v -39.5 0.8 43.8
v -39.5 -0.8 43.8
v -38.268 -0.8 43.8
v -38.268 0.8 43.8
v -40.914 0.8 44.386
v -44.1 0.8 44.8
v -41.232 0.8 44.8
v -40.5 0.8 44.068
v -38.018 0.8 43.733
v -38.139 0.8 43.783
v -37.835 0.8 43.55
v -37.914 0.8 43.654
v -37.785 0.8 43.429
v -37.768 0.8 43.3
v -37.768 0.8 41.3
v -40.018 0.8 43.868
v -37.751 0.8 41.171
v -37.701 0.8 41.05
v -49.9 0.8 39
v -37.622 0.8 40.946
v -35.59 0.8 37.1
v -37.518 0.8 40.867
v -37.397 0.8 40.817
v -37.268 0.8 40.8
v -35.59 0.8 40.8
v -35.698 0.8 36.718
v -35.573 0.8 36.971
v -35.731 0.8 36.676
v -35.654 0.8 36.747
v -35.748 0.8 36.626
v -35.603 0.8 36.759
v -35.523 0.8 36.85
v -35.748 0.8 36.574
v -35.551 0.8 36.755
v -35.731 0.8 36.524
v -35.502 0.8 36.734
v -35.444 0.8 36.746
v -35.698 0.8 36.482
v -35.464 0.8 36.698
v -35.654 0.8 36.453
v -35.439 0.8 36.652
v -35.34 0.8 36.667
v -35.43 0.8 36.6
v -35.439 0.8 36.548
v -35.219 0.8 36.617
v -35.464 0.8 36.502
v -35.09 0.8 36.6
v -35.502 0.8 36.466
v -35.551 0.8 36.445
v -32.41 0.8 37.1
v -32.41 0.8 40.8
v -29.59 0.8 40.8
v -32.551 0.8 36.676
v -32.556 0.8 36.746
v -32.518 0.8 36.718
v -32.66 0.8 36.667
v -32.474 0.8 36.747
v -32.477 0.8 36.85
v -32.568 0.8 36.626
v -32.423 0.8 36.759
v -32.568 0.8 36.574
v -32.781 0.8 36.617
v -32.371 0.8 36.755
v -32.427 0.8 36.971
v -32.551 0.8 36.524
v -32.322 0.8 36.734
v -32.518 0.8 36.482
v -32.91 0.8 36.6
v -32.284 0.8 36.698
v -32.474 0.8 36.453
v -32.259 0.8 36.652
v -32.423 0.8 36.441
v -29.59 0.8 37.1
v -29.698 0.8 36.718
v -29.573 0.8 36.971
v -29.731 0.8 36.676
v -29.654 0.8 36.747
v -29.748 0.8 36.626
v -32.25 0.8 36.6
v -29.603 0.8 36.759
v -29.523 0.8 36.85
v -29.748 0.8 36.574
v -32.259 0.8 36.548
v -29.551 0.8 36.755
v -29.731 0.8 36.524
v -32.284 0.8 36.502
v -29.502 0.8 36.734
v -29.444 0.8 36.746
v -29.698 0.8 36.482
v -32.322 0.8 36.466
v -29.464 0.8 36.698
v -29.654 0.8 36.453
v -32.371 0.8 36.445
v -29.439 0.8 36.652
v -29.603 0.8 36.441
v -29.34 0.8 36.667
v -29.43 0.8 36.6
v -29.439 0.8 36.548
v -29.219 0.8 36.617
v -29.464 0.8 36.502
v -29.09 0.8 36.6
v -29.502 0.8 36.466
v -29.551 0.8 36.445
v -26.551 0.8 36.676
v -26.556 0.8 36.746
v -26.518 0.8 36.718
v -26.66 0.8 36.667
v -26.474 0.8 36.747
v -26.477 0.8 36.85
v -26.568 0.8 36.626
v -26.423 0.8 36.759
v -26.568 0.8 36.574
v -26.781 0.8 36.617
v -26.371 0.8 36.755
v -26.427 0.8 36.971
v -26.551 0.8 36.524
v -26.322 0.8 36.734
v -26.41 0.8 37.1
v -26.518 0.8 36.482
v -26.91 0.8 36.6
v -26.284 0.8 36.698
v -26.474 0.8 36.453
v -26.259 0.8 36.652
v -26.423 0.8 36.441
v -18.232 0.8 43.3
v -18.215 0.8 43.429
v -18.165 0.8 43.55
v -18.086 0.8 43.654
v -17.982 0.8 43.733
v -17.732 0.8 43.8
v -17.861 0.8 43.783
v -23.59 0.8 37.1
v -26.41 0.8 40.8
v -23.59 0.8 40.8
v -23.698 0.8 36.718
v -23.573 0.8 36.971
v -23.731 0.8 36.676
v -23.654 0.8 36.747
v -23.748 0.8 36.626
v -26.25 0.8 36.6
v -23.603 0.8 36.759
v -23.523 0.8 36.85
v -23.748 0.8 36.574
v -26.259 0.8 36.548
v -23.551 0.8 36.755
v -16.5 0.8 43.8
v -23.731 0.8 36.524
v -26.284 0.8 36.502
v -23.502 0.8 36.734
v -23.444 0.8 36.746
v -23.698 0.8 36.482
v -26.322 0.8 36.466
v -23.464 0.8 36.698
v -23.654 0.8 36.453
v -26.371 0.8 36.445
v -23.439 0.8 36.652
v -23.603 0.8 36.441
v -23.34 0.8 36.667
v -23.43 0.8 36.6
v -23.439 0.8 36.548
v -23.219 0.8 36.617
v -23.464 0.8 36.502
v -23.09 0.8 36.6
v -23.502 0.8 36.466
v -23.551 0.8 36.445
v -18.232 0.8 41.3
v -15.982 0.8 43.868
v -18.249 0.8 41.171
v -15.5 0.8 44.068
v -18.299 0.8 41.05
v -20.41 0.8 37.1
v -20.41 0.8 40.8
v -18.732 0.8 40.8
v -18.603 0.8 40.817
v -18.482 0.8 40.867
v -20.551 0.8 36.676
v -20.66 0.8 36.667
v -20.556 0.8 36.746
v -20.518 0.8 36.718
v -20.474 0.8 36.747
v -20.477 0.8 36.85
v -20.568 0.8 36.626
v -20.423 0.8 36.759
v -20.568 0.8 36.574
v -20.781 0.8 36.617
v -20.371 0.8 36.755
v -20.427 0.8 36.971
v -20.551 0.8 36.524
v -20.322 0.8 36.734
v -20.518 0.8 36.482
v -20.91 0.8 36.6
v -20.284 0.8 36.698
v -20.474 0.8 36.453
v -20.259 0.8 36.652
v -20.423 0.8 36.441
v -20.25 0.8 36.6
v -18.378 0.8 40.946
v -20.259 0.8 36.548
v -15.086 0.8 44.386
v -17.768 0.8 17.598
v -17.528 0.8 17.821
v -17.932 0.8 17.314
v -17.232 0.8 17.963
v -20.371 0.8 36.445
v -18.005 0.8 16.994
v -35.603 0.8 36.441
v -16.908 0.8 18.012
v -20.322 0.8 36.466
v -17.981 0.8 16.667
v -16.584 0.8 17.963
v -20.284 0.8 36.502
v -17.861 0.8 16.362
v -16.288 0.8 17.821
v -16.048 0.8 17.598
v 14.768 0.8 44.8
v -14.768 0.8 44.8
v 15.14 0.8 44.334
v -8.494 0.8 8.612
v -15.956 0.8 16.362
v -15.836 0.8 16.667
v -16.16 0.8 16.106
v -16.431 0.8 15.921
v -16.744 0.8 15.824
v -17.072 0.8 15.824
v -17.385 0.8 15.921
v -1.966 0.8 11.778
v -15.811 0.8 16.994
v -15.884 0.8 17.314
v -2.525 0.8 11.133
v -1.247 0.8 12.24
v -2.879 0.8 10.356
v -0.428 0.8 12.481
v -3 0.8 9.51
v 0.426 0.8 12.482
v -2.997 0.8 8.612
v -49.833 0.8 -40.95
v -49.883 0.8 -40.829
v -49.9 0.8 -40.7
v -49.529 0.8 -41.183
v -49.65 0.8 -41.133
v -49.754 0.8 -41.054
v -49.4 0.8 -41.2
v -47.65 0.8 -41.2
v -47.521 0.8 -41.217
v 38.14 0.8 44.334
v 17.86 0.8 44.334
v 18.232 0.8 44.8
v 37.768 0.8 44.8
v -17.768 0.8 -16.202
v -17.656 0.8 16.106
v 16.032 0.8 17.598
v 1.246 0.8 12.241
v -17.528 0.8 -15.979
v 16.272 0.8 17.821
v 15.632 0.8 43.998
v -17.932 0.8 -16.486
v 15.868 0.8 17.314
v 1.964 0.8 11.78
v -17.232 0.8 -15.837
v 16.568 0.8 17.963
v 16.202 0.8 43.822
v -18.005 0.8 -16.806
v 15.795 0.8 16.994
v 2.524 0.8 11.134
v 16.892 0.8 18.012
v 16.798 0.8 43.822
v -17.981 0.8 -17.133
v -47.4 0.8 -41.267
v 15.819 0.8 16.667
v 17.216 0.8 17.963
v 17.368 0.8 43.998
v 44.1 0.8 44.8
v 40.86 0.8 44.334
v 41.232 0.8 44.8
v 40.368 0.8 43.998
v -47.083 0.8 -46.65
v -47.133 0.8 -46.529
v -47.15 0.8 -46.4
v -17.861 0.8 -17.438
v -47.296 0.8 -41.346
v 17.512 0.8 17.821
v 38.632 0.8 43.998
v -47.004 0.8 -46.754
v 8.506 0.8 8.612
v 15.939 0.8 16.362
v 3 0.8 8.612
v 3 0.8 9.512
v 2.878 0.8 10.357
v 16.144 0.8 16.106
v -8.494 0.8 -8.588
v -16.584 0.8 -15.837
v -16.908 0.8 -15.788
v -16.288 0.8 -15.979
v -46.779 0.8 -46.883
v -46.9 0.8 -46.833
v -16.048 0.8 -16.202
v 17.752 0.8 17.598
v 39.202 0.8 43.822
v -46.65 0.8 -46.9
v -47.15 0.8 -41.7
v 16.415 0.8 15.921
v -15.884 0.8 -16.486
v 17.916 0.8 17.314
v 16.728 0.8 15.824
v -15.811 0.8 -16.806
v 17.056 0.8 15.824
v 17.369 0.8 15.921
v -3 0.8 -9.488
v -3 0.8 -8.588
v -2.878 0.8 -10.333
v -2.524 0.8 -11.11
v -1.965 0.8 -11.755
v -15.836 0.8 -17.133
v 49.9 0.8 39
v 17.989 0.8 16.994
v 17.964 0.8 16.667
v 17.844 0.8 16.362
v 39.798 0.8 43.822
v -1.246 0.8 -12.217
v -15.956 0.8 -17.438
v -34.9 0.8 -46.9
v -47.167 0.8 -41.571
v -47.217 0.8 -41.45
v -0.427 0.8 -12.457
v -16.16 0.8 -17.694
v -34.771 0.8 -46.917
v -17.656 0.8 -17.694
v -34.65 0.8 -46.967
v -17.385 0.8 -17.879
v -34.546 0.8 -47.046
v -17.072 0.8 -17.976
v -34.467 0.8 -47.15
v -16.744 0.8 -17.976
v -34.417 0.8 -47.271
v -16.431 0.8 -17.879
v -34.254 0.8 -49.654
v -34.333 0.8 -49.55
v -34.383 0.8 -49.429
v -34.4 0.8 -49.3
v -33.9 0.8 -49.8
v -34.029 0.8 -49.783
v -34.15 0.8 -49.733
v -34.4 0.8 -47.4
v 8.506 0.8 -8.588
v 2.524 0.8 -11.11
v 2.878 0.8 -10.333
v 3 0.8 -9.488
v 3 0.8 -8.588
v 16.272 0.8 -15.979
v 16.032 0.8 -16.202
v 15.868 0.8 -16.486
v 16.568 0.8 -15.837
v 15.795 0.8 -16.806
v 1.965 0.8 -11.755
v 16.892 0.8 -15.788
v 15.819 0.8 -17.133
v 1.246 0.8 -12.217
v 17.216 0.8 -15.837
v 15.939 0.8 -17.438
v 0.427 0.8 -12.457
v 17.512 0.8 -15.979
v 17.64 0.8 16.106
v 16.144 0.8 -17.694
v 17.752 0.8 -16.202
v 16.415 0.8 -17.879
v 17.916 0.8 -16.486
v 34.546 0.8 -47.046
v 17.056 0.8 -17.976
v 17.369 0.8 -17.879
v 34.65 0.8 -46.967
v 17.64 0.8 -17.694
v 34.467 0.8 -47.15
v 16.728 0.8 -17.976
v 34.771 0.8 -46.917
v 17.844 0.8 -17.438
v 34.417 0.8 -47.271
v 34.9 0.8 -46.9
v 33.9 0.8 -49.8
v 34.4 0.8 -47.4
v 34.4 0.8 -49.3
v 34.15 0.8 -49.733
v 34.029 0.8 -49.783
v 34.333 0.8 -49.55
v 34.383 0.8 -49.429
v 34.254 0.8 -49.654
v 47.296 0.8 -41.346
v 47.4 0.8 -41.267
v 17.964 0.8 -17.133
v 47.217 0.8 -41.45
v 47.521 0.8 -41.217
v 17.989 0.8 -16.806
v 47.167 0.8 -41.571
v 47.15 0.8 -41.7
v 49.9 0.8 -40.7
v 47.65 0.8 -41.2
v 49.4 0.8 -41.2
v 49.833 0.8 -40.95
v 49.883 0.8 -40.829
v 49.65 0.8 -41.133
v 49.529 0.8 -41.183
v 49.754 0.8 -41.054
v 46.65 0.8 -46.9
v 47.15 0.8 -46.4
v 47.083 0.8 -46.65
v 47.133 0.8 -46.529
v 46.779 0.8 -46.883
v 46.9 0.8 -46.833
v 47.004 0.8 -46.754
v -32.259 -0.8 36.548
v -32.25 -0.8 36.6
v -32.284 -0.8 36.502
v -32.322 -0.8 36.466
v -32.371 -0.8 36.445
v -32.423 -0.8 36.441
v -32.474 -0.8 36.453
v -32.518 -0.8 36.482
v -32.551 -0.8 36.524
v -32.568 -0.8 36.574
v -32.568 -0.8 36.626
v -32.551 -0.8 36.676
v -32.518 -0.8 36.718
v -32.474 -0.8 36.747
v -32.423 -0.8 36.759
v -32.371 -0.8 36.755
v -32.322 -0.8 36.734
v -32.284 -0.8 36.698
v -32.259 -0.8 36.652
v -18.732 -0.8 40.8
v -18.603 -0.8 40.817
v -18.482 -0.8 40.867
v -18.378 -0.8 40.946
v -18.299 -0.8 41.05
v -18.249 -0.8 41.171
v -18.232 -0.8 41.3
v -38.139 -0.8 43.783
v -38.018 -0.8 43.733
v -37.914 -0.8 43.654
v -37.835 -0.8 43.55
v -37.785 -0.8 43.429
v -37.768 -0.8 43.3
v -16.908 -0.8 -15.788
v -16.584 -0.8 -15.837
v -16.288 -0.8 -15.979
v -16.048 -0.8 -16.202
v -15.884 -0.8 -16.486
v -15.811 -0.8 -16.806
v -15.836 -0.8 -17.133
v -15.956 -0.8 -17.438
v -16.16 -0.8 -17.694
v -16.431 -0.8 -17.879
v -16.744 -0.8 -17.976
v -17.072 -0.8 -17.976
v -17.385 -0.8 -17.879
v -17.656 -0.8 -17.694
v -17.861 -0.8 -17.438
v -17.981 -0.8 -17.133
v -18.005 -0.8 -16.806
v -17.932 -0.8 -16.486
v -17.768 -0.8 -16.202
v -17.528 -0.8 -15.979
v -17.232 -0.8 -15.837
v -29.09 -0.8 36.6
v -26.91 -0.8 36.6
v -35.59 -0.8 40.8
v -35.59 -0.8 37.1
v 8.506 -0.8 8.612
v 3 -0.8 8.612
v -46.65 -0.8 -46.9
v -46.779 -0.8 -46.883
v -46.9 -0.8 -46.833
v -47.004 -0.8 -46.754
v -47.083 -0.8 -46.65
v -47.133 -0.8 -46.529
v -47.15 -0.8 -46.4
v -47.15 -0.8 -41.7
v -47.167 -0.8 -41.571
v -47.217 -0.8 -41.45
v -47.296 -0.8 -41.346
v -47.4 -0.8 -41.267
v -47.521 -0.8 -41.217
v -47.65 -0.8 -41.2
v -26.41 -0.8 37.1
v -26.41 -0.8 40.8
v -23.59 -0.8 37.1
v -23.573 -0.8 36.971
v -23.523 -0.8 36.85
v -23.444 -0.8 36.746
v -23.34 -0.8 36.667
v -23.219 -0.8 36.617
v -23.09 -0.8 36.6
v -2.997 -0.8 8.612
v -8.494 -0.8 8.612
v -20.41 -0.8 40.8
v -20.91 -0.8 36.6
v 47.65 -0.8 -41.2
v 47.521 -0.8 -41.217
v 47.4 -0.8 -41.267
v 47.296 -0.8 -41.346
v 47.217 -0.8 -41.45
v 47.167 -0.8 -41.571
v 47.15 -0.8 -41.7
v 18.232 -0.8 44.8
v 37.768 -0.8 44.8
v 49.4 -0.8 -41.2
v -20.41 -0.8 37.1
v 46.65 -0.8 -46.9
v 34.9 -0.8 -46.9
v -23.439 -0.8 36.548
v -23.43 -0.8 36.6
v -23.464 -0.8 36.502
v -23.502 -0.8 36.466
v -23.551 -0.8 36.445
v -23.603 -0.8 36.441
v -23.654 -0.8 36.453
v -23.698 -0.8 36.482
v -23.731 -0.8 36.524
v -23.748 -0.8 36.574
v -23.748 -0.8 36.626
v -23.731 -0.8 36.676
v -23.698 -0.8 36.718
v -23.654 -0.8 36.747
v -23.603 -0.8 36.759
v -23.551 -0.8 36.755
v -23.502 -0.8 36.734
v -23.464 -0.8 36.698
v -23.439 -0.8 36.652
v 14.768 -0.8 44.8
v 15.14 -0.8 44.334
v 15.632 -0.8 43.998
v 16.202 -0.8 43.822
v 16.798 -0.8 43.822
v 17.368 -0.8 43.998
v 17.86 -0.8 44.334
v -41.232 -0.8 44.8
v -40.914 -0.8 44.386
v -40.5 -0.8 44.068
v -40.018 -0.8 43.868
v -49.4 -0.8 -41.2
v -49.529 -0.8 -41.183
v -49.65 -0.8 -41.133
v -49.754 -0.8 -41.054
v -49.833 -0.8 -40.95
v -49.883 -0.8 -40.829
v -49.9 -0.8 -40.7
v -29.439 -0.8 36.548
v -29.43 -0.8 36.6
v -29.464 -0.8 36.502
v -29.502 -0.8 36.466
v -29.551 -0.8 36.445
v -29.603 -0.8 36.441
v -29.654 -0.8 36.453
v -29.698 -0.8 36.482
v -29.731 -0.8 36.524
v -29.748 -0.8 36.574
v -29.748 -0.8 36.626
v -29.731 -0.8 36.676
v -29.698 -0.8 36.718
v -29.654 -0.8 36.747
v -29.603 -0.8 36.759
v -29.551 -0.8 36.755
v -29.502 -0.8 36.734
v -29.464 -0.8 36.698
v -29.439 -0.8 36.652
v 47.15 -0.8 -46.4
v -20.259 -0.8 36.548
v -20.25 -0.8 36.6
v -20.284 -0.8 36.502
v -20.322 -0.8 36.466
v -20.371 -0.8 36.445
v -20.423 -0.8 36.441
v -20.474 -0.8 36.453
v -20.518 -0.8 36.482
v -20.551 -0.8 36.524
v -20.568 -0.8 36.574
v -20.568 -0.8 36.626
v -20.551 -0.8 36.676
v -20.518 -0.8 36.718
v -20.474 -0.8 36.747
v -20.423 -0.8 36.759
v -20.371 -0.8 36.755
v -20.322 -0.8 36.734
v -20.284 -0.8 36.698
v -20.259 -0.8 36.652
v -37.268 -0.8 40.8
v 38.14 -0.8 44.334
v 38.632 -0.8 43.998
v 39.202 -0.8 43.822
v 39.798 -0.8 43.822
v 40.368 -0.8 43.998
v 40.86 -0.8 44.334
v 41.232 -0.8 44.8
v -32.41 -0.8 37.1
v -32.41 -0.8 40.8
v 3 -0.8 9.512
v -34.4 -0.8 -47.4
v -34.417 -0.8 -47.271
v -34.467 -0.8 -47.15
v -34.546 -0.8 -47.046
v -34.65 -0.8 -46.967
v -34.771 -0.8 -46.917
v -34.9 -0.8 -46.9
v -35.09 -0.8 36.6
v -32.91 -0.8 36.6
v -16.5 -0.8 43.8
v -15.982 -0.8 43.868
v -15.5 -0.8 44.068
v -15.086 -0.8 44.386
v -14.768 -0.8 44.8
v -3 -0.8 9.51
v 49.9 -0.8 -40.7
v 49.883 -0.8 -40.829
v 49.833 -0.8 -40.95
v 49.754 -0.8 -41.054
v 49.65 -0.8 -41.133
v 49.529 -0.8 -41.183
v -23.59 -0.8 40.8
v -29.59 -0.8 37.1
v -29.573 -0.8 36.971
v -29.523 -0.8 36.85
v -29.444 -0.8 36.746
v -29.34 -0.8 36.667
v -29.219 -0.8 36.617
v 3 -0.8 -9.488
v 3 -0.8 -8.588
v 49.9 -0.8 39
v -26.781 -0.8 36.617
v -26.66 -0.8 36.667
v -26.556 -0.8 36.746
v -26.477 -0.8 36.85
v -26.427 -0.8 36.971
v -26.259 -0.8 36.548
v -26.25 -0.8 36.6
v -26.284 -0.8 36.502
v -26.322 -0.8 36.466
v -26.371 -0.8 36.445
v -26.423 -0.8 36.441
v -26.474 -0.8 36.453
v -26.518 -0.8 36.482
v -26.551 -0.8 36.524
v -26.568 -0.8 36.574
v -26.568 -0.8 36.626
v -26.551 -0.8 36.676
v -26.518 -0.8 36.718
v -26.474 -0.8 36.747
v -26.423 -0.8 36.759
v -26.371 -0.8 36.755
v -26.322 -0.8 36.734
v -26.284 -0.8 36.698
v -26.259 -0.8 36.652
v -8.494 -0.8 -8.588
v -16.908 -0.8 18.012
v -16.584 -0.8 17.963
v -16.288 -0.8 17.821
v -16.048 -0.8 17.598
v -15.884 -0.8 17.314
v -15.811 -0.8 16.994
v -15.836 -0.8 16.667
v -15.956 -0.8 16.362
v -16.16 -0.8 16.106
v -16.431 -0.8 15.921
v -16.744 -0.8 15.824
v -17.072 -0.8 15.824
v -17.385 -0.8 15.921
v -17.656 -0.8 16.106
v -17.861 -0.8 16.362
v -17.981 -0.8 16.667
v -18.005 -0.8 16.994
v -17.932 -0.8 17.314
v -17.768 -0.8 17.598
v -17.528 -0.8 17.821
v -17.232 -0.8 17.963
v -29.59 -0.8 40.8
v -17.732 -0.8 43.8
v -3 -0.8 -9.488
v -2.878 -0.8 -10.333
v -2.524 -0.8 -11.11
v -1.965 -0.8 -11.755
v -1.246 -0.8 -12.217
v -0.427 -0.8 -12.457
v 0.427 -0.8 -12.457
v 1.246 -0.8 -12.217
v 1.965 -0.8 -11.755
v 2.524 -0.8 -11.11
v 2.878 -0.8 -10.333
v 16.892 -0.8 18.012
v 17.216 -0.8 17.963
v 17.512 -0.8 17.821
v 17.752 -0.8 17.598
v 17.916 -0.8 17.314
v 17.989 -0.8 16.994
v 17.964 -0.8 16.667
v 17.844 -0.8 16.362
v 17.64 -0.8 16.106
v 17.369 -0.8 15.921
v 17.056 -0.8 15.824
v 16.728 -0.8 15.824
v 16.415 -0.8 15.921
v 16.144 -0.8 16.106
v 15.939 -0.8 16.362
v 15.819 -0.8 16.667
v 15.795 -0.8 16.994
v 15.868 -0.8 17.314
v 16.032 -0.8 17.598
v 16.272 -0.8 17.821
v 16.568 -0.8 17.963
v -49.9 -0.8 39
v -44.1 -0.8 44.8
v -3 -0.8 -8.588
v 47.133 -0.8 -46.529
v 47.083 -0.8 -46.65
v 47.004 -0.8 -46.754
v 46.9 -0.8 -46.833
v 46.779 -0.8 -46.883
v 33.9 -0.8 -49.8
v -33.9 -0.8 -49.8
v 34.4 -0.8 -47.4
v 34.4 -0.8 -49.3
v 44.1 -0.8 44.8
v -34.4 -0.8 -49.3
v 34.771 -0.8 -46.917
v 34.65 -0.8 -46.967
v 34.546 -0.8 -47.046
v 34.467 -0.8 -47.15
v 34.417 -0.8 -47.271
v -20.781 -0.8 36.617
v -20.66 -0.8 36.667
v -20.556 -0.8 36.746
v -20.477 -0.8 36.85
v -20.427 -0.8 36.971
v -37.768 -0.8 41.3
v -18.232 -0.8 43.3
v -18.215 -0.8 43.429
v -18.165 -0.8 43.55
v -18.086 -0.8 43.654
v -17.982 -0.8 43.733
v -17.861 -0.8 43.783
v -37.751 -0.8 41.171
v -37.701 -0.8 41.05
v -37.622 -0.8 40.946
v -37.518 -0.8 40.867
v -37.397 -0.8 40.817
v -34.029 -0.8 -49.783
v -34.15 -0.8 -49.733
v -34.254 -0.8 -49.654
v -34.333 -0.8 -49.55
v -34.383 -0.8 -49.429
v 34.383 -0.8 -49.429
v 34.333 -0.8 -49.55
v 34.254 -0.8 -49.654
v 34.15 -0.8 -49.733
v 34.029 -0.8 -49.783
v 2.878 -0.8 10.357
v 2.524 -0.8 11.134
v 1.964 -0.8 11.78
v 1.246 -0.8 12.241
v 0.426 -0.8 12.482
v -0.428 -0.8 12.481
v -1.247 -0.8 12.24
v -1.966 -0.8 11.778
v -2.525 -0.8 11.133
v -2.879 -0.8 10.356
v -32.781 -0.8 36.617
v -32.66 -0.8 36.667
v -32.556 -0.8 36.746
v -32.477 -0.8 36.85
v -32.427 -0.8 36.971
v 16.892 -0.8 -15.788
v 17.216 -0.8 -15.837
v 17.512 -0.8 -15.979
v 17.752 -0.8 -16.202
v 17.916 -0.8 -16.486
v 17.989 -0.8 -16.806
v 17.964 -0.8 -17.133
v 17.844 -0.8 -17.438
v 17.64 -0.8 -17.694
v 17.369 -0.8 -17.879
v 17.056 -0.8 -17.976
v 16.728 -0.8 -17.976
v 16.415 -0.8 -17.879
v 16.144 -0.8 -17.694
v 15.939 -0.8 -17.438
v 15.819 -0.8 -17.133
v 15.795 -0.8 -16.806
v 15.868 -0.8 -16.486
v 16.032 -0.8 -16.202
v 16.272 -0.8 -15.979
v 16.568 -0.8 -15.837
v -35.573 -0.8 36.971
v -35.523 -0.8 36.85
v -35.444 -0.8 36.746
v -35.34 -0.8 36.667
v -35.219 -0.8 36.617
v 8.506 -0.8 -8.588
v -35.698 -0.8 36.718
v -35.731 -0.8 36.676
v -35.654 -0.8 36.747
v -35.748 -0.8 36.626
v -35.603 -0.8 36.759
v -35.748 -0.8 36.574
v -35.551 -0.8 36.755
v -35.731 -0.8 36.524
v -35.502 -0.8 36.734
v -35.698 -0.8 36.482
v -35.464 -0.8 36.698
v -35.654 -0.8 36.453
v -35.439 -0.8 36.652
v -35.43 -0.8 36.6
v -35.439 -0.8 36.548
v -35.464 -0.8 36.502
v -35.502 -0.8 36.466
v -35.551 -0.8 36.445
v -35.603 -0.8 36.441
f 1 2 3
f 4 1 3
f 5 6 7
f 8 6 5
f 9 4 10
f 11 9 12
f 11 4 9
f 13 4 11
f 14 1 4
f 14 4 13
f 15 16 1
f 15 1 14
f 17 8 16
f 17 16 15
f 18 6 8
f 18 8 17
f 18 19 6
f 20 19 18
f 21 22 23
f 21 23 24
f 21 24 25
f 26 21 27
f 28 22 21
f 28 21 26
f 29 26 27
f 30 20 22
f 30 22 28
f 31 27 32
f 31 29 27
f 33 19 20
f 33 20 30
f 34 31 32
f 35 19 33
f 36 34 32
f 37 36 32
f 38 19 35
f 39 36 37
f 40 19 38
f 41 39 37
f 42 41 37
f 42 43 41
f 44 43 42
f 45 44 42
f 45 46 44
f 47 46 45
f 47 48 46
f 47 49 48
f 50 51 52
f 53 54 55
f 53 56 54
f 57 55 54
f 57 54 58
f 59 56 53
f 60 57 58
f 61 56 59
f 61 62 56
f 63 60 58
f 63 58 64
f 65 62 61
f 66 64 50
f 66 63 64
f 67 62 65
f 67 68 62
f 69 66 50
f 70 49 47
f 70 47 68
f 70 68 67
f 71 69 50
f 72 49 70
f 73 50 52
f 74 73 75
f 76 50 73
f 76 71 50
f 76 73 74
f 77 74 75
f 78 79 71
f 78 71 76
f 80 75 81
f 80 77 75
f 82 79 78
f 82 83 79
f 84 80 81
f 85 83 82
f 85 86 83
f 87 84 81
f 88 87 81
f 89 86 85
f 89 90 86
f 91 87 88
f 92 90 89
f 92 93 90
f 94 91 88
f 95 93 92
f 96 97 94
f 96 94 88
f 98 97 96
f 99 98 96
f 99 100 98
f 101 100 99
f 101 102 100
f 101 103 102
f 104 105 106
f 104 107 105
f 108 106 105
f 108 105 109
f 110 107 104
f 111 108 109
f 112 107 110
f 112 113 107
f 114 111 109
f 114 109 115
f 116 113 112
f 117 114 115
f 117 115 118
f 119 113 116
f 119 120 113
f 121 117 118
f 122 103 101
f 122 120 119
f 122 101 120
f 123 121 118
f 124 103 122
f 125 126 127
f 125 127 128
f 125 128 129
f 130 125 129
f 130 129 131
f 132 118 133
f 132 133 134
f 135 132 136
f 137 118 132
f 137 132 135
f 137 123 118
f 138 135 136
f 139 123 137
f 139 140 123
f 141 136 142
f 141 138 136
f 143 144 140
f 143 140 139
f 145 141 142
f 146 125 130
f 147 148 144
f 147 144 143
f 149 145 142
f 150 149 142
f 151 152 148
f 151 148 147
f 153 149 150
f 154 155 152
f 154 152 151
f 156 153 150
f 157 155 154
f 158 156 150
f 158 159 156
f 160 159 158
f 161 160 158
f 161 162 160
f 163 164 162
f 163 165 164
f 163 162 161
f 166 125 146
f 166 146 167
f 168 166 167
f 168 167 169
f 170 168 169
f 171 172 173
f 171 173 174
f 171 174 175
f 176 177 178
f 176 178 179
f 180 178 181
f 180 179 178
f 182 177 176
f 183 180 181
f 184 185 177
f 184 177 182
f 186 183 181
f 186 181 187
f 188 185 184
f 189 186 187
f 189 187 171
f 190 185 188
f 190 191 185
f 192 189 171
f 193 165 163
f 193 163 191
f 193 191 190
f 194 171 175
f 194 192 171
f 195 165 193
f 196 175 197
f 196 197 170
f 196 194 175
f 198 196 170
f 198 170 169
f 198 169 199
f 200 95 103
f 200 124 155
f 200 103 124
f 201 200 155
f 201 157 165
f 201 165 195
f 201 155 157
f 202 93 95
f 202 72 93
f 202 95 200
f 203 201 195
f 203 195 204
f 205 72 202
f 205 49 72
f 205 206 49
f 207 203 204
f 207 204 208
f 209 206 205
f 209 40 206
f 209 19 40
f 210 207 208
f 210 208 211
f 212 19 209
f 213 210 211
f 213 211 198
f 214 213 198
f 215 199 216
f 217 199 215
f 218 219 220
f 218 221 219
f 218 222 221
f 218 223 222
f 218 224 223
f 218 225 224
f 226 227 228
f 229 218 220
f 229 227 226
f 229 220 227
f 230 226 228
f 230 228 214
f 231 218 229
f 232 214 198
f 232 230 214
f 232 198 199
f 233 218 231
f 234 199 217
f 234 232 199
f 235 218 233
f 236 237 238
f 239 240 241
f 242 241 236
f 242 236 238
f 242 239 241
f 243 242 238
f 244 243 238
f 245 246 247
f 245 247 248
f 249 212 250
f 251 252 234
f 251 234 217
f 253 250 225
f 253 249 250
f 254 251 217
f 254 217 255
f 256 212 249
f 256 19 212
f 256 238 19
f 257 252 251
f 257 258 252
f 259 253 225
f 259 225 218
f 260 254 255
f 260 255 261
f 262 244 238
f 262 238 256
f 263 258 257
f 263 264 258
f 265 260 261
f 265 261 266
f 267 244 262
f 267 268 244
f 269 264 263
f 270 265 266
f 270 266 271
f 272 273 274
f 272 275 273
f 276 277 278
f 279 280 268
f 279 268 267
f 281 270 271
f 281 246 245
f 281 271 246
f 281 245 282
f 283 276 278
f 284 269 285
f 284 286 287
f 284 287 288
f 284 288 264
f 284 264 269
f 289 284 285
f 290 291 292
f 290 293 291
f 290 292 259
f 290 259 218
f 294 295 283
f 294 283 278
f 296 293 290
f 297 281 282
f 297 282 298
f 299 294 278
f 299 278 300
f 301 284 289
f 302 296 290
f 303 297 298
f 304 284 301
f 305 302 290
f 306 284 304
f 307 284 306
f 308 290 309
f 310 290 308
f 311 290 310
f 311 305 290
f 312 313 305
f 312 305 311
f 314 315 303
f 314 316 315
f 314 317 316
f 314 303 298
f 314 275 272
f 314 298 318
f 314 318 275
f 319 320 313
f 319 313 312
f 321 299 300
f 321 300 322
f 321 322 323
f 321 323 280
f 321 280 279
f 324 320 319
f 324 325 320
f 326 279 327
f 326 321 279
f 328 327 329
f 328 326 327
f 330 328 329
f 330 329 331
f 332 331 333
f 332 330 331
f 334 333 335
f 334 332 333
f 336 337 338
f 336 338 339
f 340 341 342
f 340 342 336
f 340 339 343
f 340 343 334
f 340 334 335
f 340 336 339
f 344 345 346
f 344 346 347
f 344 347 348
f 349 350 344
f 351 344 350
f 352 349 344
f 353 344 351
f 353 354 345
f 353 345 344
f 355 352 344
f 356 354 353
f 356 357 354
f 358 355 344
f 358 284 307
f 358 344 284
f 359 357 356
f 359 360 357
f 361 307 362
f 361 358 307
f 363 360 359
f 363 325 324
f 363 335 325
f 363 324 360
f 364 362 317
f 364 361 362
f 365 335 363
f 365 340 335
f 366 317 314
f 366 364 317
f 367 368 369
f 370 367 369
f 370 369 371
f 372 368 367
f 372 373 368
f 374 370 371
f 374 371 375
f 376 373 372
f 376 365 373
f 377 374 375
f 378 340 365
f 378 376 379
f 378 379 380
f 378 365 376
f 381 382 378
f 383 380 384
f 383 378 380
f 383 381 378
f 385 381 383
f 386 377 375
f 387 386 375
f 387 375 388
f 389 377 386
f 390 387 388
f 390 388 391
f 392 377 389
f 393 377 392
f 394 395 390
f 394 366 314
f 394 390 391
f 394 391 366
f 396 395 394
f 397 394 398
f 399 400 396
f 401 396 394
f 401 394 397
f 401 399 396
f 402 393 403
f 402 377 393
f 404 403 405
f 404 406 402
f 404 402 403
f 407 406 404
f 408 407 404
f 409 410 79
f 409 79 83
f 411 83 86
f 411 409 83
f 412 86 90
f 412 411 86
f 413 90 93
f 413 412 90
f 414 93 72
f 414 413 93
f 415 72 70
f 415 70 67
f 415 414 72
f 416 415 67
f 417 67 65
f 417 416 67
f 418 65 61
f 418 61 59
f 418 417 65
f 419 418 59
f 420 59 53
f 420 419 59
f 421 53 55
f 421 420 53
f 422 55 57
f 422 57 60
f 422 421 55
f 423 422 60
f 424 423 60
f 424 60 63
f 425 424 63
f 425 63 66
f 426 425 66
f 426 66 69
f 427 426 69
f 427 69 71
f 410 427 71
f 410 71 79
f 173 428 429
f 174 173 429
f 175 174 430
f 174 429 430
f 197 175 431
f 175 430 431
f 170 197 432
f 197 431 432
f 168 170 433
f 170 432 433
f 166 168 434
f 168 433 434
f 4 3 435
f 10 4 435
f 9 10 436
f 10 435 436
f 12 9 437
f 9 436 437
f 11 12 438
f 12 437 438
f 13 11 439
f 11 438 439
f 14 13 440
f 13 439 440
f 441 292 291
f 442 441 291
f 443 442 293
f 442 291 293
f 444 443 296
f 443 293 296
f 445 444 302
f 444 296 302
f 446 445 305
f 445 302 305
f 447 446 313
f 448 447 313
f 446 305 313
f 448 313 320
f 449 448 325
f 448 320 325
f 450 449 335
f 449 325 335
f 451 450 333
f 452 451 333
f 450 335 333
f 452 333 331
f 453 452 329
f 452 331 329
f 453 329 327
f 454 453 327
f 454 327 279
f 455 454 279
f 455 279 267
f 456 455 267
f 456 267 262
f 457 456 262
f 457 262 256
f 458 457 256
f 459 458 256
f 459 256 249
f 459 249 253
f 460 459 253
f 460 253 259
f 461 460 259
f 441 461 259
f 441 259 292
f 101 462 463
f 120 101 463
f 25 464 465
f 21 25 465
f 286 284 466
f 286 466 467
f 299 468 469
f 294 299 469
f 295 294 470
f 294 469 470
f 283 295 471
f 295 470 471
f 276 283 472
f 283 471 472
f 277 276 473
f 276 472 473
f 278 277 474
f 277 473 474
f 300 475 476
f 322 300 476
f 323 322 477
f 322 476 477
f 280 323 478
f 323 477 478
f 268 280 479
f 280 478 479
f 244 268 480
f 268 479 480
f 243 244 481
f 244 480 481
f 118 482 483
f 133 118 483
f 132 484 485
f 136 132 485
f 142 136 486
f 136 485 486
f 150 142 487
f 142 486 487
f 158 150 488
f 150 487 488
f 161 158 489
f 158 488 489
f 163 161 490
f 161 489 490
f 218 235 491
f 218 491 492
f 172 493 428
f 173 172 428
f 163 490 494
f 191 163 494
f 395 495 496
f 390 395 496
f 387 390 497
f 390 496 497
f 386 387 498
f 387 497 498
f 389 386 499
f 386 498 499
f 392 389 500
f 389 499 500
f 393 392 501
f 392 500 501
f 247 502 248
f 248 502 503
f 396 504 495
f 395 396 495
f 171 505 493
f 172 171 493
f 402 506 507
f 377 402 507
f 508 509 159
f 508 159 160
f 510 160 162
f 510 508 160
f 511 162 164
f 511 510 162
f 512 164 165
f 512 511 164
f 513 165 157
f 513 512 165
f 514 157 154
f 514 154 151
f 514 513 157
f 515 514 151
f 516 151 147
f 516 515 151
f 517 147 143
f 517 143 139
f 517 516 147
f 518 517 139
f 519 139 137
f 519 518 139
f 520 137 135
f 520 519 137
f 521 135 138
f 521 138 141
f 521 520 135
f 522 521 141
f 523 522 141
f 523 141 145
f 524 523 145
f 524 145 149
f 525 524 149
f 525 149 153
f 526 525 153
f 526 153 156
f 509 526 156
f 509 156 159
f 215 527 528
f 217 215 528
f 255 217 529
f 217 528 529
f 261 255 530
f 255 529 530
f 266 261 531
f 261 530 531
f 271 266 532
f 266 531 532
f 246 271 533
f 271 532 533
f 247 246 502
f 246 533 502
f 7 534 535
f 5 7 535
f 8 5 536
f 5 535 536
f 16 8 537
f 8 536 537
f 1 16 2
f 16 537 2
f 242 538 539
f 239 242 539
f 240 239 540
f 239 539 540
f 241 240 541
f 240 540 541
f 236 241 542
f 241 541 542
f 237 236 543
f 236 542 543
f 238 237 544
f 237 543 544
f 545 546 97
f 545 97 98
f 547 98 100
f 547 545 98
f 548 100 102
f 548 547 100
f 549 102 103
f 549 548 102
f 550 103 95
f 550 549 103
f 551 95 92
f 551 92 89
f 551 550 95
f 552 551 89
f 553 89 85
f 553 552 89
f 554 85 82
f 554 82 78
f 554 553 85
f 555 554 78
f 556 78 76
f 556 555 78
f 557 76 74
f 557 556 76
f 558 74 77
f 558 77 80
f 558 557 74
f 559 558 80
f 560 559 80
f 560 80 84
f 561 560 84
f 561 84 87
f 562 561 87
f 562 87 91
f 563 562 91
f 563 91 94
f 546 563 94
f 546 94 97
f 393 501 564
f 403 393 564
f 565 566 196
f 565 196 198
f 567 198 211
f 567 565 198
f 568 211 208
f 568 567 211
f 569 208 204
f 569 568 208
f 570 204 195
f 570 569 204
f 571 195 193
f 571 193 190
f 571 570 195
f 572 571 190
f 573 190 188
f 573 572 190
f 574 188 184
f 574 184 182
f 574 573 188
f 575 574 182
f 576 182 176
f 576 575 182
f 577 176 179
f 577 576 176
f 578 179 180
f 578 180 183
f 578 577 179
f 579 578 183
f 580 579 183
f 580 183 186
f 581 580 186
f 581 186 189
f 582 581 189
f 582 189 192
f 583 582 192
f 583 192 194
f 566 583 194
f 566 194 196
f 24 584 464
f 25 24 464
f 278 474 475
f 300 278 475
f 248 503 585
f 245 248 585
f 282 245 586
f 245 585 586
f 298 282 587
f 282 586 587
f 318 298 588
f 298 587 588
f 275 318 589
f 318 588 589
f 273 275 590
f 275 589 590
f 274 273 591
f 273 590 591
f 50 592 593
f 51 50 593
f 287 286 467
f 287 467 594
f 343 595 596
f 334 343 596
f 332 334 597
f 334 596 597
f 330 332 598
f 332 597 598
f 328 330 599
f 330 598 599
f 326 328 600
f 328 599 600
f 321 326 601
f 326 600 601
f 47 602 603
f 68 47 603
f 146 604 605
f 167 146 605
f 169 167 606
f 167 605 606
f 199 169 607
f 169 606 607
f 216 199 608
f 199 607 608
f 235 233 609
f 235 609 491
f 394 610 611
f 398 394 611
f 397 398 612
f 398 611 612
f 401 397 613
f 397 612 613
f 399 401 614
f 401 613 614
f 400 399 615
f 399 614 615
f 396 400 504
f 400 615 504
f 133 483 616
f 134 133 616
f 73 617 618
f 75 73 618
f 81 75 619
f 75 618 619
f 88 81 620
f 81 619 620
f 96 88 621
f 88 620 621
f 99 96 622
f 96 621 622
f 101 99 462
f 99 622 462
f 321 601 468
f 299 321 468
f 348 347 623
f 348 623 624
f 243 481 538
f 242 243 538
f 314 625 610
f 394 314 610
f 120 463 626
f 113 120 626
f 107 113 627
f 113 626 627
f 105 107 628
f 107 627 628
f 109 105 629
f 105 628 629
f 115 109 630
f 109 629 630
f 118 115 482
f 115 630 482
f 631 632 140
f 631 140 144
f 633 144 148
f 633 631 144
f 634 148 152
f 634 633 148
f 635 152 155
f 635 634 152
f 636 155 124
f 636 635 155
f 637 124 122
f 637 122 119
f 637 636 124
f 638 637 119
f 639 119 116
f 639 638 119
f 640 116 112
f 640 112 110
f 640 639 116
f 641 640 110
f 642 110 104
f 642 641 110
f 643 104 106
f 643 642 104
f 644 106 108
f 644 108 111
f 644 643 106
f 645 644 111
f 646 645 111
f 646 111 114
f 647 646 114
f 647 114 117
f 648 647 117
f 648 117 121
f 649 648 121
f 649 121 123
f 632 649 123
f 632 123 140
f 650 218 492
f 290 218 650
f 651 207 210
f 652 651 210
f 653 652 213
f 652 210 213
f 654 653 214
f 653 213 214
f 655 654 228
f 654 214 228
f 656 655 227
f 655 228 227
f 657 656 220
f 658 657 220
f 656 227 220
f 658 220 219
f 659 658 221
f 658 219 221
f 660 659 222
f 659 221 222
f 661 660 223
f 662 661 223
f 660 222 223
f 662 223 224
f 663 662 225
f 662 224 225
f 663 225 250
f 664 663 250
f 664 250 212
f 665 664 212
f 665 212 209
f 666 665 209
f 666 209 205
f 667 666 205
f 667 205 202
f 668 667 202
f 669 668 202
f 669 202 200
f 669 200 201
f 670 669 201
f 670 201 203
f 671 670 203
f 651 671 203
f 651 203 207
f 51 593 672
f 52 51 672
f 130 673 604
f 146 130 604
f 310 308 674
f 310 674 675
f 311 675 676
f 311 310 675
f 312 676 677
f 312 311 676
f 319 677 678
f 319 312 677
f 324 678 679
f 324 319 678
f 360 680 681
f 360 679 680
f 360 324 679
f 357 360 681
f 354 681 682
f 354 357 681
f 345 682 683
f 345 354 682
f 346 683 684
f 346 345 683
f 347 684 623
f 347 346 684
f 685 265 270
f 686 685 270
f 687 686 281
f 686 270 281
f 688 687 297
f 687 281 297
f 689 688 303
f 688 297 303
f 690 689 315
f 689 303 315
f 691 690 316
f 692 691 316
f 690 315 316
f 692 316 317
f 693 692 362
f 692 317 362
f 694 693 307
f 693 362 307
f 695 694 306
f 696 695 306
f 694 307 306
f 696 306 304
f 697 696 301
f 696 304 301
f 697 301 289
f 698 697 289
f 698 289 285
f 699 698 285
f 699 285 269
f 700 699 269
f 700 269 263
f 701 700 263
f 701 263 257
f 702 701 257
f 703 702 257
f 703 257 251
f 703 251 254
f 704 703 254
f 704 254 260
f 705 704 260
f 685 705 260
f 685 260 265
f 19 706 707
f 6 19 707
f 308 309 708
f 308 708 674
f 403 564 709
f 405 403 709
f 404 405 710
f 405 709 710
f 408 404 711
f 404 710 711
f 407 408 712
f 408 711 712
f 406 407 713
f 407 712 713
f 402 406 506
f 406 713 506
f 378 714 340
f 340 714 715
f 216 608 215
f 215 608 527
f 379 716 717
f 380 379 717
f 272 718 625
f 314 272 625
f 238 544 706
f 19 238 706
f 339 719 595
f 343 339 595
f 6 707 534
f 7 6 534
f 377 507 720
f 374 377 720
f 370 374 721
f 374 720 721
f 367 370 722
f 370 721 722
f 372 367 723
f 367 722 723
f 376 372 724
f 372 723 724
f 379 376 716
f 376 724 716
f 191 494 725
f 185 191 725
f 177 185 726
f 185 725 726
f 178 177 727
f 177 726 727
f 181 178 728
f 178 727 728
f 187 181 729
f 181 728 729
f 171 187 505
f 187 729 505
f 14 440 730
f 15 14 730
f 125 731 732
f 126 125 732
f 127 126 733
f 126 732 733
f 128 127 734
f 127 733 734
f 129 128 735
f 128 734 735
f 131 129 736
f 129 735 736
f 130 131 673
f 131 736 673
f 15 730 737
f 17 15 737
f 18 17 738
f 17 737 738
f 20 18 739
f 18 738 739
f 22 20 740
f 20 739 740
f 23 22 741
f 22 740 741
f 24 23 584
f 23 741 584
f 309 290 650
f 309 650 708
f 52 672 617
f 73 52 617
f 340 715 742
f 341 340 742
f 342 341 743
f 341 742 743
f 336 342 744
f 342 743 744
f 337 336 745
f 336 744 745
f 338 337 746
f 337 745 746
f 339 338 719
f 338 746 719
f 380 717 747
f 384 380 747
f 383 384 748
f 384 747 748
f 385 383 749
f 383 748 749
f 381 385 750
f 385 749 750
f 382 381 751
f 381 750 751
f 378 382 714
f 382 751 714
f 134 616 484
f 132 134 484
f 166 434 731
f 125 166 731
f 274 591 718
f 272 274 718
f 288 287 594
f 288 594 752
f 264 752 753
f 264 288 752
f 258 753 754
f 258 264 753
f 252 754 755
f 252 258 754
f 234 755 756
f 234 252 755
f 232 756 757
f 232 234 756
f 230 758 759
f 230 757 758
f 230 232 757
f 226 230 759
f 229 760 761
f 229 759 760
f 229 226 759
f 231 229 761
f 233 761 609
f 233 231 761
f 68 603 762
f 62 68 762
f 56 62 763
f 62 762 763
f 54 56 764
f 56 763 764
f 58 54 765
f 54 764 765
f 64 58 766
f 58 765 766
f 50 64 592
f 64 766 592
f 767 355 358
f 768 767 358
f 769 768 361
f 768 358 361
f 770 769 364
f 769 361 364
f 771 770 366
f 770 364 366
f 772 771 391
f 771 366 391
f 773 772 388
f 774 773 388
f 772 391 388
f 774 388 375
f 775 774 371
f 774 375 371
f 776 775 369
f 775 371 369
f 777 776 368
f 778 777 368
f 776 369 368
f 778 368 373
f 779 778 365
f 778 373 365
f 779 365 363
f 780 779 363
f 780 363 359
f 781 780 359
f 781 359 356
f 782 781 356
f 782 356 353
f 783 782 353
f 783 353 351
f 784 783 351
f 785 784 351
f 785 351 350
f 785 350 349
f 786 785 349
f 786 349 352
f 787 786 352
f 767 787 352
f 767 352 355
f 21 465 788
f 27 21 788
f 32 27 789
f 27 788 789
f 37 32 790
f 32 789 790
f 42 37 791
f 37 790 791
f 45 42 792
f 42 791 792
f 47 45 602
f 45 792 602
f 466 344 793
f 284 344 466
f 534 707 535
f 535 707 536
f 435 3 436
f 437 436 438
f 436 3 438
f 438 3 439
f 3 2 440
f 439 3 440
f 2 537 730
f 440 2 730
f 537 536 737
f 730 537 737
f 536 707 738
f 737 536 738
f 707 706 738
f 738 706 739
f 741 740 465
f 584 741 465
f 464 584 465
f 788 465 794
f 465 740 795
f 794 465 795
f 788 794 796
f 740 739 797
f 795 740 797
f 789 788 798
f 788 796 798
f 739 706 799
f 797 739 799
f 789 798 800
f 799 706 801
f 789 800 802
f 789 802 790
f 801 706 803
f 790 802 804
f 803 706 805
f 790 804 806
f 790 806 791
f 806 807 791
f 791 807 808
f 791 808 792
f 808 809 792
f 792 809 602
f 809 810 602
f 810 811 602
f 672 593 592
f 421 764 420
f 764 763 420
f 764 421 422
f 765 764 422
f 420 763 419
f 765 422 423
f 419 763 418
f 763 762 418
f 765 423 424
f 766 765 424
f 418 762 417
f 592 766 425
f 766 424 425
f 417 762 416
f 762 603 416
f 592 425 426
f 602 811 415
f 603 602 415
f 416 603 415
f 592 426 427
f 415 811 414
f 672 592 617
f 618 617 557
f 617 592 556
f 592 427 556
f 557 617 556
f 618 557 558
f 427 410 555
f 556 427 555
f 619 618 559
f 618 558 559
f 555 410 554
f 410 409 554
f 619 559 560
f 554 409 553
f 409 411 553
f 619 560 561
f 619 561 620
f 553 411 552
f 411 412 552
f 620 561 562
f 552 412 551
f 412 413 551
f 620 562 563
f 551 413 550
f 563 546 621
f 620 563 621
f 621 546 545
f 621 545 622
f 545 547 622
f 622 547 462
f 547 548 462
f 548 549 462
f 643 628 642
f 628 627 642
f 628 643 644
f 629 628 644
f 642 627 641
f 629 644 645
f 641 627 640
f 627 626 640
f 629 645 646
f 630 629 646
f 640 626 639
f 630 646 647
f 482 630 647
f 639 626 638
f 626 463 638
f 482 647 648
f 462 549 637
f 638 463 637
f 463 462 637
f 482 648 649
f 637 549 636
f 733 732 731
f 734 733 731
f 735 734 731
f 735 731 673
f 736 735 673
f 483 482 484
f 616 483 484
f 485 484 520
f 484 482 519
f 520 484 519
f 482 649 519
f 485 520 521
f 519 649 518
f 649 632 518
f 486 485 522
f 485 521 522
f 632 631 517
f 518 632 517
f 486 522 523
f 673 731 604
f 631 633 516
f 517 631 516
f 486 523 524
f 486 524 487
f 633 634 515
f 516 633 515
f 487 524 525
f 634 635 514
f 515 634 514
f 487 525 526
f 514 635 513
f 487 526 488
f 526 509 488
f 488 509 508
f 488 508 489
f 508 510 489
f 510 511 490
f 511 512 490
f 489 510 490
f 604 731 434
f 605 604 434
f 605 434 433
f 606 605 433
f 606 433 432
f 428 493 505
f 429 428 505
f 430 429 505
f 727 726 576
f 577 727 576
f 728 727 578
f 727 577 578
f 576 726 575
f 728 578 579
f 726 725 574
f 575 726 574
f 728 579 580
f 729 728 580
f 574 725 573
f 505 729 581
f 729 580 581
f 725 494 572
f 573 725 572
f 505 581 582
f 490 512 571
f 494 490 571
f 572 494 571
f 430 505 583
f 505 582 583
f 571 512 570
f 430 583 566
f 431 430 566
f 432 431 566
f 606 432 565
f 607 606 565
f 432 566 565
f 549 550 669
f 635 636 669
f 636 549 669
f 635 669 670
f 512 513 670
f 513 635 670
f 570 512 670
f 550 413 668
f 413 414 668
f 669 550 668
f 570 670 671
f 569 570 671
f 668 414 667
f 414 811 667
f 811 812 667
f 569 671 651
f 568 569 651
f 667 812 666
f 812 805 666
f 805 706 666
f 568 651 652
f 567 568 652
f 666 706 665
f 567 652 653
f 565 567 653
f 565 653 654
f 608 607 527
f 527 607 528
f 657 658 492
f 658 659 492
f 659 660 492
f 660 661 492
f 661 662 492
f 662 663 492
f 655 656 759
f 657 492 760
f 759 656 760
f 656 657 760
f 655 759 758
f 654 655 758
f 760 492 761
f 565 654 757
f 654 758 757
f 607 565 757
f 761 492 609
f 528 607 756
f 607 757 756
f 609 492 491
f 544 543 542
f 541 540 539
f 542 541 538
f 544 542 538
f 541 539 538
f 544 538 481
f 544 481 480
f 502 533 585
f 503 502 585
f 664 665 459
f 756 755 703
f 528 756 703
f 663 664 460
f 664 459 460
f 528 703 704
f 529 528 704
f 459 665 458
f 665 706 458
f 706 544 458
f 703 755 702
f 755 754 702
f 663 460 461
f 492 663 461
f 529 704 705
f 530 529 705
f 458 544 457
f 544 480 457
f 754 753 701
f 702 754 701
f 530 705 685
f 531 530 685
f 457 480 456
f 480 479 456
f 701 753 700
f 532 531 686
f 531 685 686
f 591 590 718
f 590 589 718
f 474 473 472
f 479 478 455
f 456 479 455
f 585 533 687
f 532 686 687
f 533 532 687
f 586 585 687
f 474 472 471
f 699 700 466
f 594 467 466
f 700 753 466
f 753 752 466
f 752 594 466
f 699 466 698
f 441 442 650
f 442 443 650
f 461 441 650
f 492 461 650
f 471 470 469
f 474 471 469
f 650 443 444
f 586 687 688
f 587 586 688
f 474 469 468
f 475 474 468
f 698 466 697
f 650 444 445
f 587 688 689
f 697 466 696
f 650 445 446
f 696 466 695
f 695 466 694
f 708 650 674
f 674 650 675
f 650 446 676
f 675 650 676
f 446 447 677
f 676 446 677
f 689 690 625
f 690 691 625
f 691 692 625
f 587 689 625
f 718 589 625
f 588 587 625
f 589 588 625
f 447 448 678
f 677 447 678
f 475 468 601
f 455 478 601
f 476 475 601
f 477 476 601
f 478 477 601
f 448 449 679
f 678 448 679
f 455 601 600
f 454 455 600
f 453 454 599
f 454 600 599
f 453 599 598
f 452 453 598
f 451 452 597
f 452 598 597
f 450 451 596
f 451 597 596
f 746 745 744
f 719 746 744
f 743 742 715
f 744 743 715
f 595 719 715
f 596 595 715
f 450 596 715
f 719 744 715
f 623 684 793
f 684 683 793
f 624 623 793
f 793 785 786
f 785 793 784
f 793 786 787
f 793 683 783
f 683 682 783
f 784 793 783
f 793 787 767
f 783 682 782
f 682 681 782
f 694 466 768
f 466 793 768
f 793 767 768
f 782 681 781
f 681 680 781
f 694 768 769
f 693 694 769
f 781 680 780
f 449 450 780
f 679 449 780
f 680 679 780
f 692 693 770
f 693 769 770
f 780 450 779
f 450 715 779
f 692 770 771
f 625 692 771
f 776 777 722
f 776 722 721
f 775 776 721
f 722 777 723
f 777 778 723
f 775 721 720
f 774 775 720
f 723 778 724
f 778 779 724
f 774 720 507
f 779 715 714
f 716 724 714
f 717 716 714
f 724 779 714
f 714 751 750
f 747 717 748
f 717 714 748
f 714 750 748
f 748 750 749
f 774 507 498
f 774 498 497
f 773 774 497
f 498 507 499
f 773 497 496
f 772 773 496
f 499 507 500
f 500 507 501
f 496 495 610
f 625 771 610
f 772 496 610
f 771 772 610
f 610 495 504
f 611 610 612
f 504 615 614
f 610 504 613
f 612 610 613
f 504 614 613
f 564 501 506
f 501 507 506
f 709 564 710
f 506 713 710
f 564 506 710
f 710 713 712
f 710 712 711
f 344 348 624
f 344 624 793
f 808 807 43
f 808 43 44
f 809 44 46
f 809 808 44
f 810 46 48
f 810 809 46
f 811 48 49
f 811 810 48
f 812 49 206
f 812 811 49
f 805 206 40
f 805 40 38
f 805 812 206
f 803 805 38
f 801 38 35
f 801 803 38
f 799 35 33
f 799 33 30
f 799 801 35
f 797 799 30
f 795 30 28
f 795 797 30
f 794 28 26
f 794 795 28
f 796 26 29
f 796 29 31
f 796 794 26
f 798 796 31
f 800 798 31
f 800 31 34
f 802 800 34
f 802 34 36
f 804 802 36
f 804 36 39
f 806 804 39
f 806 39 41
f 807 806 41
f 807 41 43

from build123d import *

# Parameters (mm, degrees)
GENERICCARDPCBDEFINITION_FILLET3_START   = -0.8
GENERICCARDPCBDEFINITION_FILLET3_OUTLI_R = 0.16
GENERICCARDPCBDEFINITION_FILLET3_DEPTH   = 1.6
SKETCH1_R                                = 1.1
CUT_EXTRUDE1_DEPTH                       = 10


# Read off the part's stored shape, not the designer's step: <GenericCardPCBDefinition>-<Fillet3>
with BuildPart() as part:
    # <GenericCardPCBDefinition>-<Fillet3> outli → <GenericCardPCBDefinition>-<Fillet3> (new body)
    with BuildSketch(Plane(origin=(0, 0, 0), x_dir=(1, 0, 0), z_dir=(0, 1, 0)).offset(GENERICCARDPCBDEFINITION_FILLET3_START)):
        with BuildLine():
            ThreePointArc((-41.232050808, -44.8), (-40.5, -44.067949192), (-39.5, -43.8))
            Line((-39.5, -43.8), (-38.267949192, -43.8))
            ThreePointArc((-38.267949192, -43.8), (-37.914395801, -43.653553391), (-37.767949192, -43.3))
            Line((-37.767949192, -43.3), (-37.767949192, -41.3))
            ThreePointArc((-37.767949192, -41.3), (-37.621502583, -40.946446609), (-37.267949192, -40.8))
            Line((-37.267949192, -40.8), (-35.59, -40.8))
            Line((-35.59, -40.8), (-35.59, -37.1))
            ThreePointArc((-35.59, -37.1), (-35.443553391, -36.746446609), (-35.09, -36.6))
            Line((-35.09, -36.6), (-32.91, -36.6))
            ThreePointArc((-32.91, -36.6), (-32.556446609, -36.746446609), (-32.41, -37.1))
            Line((-32.41, -37.1), (-32.41, -40.8))
            Line((-32.41, -40.8), (-29.59, -40.8))
            Line((-29.59, -40.8), (-29.59, -37.1))
            ThreePointArc((-29.59, -37.1), (-29.443553391, -36.746446609), (-29.09, -36.6))
            Line((-29.09, -36.6), (-26.91, -36.6))
            ThreePointArc((-26.91, -36.6), (-26.556446609, -36.746446609), (-26.41, -37.1))
            Line((-26.41, -37.1), (-26.41, -40.8))
            Line((-26.41, -40.8), (-23.59, -40.8))
            Line((-23.59, -40.8), (-23.59, -37.1))
            ThreePointArc((-23.59, -37.1), (-23.443553391, -36.746446609), (-23.09, -36.6))
            Line((-23.09, -36.6), (-20.91, -36.6))
            ThreePointArc((-20.91, -36.6), (-20.556446609, -36.746446609), (-20.41, -37.1))
            Line((-20.41, -37.1), (-20.41, -40.8))
            Line((-20.41, -40.8), (-18.732050808, -40.8))
            ThreePointArc((-18.732050808, -40.8), (-18.378497417, -40.946446609), (-18.232050808, -41.3))
            Line((-18.232050808, -41.3), (-18.232050808, -43.3))
            ThreePointArc((-18.232050808, -43.3), (-18.085604199, -43.653553391), (-17.732050808, -43.8))
            Line((-17.732050808, -43.8), (-16.5, -43.8))
            ThreePointArc((-16.5, -43.8), (-15.5, -44.067949192), (-14.767949192, -44.8))
            Line((-14.767949192, -44.8), (14.767949192, -44.8))
            ThreePointArc((14.767949192, -44.8), (16.5, -43.8), (18.232050808, -44.8))
            Line((18.232050808, -44.8), (37.767949192, -44.8))
            ThreePointArc((37.767949192, -44.8), (39.5, -43.8), (41.232050808, -44.8))
            Line((41.232050808, -44.8), (44.1, -44.8))
            Line((44.1, -44.8), (49.9, -39))
            Line((49.9, -39), (49.9, 40.7))
            ThreePointArc((49.9, 40.7), (49.753553391, 41.053553391), (49.4, 41.2))
            Line((49.4, 41.2), (47.65, 41.2))
            ThreePointArc((47.65, 41.2), (47.296446609, 41.346446609), (47.15, 41.7))
            Line((47.15, 41.7), (47.15, 46.4))
            ThreePointArc((47.15, 46.4), (47.003553391, 46.753553391), (46.65, 46.9))
            Line((46.65, 46.9), (34.9, 46.9))
            ThreePointArc((34.9, 46.9), (34.546446609, 47.046446609), (34.4, 47.4))
            Line((34.4, 47.4), (34.4, 49.3))
            ThreePointArc((34.4, 49.3), (34.253553391, 49.653553391), (33.9, 49.8))
            Line((33.9, 49.8), (-33.9, 49.8))
            ThreePointArc((-33.9, 49.8), (-34.253553391, 49.653553391), (-34.4, 49.3))
            Line((-34.4, 49.3), (-34.4, 47.4))
            ThreePointArc((-34.4, 47.4), (-34.546446609, 47.046446609), (-34.9, 46.9))
            Line((-34.9, 46.9), (-46.65, 46.9))
            ThreePointArc((-46.65, 46.9), (-47.003553391, 46.753553391), (-47.15, 46.4))
            Line((-47.15, 46.4), (-47.15, 41.7))
            ThreePointArc((-47.15, 41.7), (-47.296446609, 41.346446609), (-47.65, 41.2))
            Line((-47.65, 41.2), (-49.4, 41.2))
            ThreePointArc((-49.4, 41.2), (-49.753553391, 41.053553391), (-49.9, 40.7))
            Line((-49.9, 40.7), (-49.9, -39))
            Line((-49.9, -39), (-44.1, -44.8))
            Line((-44.1, -44.8), (-41.232050808, -44.8))
        make_face()
        with Locations((-35.59, -36.6)):
            Circle(GENERICCARDPCBDEFINITION_FILLET3_OUTLI_R, mode=Mode.SUBTRACT)
        with Locations((-32.41, -36.6)):
            Circle(GENERICCARDPCBDEFINITION_FILLET3_OUTLI_R, mode=Mode.SUBTRACT)
        with Locations((-29.59, -36.6)):
            Circle(GENERICCARDPCBDEFINITION_FILLET3_OUTLI_R, mode=Mode.SUBTRACT)
        with Locations((-26.41, -36.6)):
            Circle(GENERICCARDPCBDEFINITION_FILLET3_OUTLI_R, mode=Mode.SUBTRACT)
        with Locations((-23.59, -36.6)):
            Circle(GENERICCARDPCBDEFINITION_FILLET3_OUTLI_R, mode=Mode.SUBTRACT)
        with Locations((-20.41, -36.6)):
            Circle(GENERICCARDPCBDEFINITION_FILLET3_OUTLI_R, mode=Mode.SUBTRACT)
    extrude(amount=GENERICCARDPCBDEFINITION_FILLET3_DEPTH)

    # Sketch1 → Cut-Extrude1 (cut)
    with BuildSketch(Plane(origin=(0, 0.8, 0), x_dir=(1, 0, 0), z_dir=(0, 1, 0))):
        with Locations(Location((16.891859219, -16.911976124, 0), (0, 0, 270))):
            Circle(SKETCH1_R)
        with Locations(Location((16.891859219, 16.888023876, 0), (0, 0, 270))):
            Circle(SKETCH1_R)
        with Locations(Location((-16.908140781, -16.911976124, 0), (0, 0, 270))):
            Circle(SKETCH1_R)
        with Locations(Location((-16.908140781, 16.888023876, 0), (0, 0, 270))):
            Circle(SKETCH1_R)
        with BuildLine():
            Line((8.506216867, -8.611976124), (3, -8.611976124))
            Line((3, -8.611976124), (3, -9.511976124))
            ThreePointArc((3, -9.511976124), (-0.000900642, -12.511975988), (-2.999999459, -9.51017484))
            Line((-2.999999459, -9.51017484), (-2.997060521, -8.611976124))
            Line((-2.997060521, -8.611976124), (-8.493783133, -8.611976124))
            Line((-8.493783133, -8.611976124), (-8.493783133, 8.588023876))
            Line((-8.493783133, 8.588023876), (-3, 8.588023876))
            Line((-3, 8.588023876), (-3, 9.488023876))
            ThreePointArc((-3, 9.488023876), (0, 12.488023876), (3, 9.488023876))
            Line((3, 9.488023876), (3, 8.588023876))
            Line((3, 8.588023876), (8.506216867, 8.588023876))
            Line((8.506216867, 8.588023876), (8.506216867, -8.611976124))
        make_face()
    extrude(amount=-CUT_EXTRUDE1_DEPTH, mode=Mode.SUBTRACT)


solid = part.part
